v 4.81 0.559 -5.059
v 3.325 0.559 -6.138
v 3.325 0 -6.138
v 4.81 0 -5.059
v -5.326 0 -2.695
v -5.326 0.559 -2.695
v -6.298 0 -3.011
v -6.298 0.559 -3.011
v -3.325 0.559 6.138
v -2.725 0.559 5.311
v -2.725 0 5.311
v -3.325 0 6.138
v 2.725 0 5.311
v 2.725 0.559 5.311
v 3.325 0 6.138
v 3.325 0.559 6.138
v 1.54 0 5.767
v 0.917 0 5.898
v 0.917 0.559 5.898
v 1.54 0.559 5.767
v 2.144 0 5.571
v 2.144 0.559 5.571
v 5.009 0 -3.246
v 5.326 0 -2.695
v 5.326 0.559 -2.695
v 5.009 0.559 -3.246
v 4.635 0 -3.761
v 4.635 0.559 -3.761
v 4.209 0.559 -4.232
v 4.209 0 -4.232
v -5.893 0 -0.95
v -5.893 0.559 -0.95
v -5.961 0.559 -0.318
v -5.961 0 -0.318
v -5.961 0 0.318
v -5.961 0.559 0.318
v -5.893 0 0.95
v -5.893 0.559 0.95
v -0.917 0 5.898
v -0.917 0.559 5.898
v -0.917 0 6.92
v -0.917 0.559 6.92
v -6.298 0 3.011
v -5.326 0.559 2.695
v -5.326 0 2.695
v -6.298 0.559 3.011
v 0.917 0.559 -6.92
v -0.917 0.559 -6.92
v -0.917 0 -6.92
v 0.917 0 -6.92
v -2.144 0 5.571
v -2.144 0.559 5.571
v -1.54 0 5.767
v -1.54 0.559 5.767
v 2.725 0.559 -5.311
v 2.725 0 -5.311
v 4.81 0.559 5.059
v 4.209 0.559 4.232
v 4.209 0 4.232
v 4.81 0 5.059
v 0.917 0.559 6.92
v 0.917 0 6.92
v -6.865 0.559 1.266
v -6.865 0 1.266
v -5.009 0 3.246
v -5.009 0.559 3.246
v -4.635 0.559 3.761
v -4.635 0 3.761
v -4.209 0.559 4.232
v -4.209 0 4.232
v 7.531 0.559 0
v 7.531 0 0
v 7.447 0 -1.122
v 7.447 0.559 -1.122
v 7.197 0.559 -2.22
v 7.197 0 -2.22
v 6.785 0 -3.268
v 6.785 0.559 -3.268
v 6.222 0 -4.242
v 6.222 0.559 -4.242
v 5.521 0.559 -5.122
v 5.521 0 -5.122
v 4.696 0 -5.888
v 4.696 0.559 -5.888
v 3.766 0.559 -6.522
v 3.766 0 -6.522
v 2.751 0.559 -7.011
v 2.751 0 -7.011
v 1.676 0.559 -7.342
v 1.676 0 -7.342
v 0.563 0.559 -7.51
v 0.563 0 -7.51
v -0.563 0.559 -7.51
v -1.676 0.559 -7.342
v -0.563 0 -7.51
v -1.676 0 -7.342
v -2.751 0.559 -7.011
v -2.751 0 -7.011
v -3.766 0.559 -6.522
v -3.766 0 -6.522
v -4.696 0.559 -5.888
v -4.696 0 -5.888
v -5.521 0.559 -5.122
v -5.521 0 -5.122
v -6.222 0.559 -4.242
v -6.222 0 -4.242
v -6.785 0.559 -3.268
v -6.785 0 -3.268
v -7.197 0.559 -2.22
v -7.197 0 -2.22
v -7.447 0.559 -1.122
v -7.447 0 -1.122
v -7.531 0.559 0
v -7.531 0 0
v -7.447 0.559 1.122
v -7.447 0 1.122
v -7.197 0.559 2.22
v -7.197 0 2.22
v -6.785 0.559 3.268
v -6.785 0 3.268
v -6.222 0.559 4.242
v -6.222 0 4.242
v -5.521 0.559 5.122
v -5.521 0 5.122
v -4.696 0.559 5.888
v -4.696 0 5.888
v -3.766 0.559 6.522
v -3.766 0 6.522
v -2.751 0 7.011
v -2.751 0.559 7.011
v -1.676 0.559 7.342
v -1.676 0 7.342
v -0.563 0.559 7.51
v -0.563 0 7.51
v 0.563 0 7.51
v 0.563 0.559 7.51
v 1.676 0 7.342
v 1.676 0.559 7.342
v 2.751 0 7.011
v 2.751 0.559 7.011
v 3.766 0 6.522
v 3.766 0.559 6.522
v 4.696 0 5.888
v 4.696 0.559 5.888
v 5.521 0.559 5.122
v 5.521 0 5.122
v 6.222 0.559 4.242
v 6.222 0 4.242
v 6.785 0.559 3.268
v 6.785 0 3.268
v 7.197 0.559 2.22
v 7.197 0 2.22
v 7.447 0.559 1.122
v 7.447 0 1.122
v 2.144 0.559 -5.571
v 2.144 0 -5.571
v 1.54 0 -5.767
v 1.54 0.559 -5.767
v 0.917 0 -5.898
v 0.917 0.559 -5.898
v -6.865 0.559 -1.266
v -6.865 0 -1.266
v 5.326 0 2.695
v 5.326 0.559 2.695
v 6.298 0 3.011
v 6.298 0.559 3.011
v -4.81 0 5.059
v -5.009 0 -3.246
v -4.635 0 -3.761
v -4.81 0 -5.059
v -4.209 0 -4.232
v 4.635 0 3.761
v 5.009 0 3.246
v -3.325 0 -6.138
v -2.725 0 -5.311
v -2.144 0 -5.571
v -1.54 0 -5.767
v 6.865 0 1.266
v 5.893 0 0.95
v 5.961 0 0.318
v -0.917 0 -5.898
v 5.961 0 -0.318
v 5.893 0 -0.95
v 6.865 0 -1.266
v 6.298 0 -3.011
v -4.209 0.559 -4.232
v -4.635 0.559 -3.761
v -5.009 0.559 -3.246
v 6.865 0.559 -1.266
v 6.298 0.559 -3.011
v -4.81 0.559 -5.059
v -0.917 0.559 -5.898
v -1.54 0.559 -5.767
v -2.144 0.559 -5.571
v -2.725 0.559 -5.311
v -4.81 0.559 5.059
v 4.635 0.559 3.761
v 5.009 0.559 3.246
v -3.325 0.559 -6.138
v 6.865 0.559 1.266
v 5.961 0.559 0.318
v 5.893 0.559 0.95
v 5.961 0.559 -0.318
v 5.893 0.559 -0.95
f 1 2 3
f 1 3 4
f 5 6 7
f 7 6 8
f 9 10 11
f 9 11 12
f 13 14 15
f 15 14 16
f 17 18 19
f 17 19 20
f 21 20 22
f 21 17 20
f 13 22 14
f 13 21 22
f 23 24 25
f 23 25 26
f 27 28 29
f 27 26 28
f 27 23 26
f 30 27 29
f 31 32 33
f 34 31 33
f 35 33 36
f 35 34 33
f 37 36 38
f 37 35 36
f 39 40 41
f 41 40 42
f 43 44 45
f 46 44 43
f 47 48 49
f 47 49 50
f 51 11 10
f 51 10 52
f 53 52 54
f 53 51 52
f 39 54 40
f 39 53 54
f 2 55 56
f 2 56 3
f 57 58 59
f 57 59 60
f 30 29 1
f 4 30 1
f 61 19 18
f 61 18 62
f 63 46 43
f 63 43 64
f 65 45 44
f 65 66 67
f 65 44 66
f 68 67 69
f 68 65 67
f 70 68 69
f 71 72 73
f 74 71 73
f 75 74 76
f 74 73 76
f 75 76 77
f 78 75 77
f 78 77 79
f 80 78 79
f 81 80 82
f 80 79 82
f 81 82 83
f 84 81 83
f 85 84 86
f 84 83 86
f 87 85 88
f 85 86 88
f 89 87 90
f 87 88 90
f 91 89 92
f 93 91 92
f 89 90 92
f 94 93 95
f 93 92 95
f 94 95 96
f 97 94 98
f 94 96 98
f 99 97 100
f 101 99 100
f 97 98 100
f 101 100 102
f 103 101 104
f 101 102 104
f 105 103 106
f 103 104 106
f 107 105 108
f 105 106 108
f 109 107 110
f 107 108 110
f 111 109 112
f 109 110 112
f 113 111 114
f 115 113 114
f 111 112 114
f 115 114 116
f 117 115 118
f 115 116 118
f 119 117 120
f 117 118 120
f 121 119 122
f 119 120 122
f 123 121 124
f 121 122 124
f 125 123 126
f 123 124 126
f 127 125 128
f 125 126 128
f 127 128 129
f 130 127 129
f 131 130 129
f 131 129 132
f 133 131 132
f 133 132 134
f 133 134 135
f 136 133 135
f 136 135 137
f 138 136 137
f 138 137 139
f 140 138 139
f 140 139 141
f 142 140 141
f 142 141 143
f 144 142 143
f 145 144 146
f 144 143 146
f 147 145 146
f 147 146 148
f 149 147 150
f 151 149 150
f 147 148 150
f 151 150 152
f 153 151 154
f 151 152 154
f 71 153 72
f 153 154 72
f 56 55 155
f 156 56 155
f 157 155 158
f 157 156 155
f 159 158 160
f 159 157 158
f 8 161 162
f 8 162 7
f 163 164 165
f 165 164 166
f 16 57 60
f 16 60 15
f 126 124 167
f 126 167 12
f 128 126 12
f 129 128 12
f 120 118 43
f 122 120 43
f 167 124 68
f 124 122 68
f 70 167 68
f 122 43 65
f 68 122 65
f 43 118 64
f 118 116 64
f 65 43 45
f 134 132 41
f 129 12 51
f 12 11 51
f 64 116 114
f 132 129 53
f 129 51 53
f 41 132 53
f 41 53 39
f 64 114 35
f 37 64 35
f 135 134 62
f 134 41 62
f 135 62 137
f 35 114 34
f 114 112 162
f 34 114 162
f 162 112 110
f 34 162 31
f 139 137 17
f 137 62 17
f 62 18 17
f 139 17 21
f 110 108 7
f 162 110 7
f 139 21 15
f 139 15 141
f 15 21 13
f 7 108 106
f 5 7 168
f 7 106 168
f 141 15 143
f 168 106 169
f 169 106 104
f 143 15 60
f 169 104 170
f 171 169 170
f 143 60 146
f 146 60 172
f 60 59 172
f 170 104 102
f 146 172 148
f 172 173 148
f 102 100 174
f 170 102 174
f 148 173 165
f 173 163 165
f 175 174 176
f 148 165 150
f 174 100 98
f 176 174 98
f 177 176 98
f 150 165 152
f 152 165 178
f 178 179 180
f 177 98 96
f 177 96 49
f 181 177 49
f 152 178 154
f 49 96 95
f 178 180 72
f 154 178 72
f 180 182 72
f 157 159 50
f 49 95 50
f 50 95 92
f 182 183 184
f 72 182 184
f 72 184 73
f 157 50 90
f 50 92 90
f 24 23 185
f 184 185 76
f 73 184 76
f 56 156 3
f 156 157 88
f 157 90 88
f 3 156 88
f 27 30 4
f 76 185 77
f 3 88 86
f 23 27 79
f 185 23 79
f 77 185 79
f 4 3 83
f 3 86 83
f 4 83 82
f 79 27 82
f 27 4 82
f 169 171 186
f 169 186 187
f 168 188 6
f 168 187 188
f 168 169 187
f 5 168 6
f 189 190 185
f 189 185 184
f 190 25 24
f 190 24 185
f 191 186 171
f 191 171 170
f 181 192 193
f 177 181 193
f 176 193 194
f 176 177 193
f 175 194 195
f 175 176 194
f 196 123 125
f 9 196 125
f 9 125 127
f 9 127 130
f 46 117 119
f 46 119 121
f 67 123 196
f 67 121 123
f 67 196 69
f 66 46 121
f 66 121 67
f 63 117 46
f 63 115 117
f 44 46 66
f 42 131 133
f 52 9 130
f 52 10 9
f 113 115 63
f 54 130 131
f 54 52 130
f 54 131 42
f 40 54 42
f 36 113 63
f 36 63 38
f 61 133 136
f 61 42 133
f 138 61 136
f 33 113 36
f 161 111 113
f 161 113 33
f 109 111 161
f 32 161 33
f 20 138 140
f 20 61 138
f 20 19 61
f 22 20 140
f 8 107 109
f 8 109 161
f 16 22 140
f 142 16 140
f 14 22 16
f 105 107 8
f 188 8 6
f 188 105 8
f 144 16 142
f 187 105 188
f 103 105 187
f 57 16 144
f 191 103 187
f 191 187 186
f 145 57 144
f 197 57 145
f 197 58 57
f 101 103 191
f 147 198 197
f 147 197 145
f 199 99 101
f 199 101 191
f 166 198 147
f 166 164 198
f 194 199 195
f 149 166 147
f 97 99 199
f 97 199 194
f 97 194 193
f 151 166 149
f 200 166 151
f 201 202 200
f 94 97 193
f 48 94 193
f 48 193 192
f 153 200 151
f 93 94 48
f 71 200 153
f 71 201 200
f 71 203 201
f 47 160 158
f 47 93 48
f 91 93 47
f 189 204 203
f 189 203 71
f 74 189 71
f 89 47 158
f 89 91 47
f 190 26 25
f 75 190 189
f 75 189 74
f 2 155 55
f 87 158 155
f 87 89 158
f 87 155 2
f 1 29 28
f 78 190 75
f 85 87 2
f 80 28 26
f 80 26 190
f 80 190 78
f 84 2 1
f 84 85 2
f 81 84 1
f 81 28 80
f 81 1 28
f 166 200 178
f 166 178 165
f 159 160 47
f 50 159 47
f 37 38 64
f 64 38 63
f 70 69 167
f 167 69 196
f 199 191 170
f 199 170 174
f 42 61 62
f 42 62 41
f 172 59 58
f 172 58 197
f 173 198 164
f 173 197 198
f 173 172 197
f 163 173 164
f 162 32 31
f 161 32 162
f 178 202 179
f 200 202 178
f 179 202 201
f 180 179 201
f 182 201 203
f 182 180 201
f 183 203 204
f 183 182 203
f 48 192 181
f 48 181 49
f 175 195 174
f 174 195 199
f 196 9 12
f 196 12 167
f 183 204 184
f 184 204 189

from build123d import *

# Parameters (mm, degrees)
SKETCH1_R           = 7.5311
SKETCH1_R_2         = 5.969
BOSS_EXTRUDE1_DEPTH = 0.5588
SKETCH2_W           = 1.834896806
SKETCH2_H           = 1.901806754
CUT_EXTRUDE1_DEPTH  = 1.5588
CIRPATTERN1_COUNT   = 10


with BuildPart() as part:
    # Sketch1 → Boss-Extrude1 (new body)
    with BuildSketch(Plane(origin=(0, 0, 0), x_dir=(1, 0, 0), z_dir=(0, 1, 0))):
        Circle(SKETCH1_R)
        Circle(SKETCH1_R_2, mode=Mode.SUBTRACT)
    extrude(amount=BOSS_EXTRUDE1_DEPTH)

    # Sketch2 → Cut-Extrude1 (cut, through all)
    with BuildSketch(Plane(origin=(0, 0.5588, 0), x_dir=(1, 0, 0), z_dir=(0, 1, 0))):
        with Locations((0, 5.969)):
            Rectangle(SKETCH2_W, SKETCH2_H)
    cut_extrude1 = extrude(amount=-CUT_EXTRUDE1_DEPTH, mode=Mode.SUBTRACT)

    # CirPattern1: Cut-Extrude1 ×10 about axis
    cirpattern1_axis = Axis((0, 0, 0), (0, 1, 0))
    for i in range(1, CIRPATTERN1_COUNT):
        add(cut_extrude1.rotate(cirpattern1_axis, i * 360 / CIRPATTERN1_COUNT), mode=Mode.SUBTRACT)


solid = part.part
